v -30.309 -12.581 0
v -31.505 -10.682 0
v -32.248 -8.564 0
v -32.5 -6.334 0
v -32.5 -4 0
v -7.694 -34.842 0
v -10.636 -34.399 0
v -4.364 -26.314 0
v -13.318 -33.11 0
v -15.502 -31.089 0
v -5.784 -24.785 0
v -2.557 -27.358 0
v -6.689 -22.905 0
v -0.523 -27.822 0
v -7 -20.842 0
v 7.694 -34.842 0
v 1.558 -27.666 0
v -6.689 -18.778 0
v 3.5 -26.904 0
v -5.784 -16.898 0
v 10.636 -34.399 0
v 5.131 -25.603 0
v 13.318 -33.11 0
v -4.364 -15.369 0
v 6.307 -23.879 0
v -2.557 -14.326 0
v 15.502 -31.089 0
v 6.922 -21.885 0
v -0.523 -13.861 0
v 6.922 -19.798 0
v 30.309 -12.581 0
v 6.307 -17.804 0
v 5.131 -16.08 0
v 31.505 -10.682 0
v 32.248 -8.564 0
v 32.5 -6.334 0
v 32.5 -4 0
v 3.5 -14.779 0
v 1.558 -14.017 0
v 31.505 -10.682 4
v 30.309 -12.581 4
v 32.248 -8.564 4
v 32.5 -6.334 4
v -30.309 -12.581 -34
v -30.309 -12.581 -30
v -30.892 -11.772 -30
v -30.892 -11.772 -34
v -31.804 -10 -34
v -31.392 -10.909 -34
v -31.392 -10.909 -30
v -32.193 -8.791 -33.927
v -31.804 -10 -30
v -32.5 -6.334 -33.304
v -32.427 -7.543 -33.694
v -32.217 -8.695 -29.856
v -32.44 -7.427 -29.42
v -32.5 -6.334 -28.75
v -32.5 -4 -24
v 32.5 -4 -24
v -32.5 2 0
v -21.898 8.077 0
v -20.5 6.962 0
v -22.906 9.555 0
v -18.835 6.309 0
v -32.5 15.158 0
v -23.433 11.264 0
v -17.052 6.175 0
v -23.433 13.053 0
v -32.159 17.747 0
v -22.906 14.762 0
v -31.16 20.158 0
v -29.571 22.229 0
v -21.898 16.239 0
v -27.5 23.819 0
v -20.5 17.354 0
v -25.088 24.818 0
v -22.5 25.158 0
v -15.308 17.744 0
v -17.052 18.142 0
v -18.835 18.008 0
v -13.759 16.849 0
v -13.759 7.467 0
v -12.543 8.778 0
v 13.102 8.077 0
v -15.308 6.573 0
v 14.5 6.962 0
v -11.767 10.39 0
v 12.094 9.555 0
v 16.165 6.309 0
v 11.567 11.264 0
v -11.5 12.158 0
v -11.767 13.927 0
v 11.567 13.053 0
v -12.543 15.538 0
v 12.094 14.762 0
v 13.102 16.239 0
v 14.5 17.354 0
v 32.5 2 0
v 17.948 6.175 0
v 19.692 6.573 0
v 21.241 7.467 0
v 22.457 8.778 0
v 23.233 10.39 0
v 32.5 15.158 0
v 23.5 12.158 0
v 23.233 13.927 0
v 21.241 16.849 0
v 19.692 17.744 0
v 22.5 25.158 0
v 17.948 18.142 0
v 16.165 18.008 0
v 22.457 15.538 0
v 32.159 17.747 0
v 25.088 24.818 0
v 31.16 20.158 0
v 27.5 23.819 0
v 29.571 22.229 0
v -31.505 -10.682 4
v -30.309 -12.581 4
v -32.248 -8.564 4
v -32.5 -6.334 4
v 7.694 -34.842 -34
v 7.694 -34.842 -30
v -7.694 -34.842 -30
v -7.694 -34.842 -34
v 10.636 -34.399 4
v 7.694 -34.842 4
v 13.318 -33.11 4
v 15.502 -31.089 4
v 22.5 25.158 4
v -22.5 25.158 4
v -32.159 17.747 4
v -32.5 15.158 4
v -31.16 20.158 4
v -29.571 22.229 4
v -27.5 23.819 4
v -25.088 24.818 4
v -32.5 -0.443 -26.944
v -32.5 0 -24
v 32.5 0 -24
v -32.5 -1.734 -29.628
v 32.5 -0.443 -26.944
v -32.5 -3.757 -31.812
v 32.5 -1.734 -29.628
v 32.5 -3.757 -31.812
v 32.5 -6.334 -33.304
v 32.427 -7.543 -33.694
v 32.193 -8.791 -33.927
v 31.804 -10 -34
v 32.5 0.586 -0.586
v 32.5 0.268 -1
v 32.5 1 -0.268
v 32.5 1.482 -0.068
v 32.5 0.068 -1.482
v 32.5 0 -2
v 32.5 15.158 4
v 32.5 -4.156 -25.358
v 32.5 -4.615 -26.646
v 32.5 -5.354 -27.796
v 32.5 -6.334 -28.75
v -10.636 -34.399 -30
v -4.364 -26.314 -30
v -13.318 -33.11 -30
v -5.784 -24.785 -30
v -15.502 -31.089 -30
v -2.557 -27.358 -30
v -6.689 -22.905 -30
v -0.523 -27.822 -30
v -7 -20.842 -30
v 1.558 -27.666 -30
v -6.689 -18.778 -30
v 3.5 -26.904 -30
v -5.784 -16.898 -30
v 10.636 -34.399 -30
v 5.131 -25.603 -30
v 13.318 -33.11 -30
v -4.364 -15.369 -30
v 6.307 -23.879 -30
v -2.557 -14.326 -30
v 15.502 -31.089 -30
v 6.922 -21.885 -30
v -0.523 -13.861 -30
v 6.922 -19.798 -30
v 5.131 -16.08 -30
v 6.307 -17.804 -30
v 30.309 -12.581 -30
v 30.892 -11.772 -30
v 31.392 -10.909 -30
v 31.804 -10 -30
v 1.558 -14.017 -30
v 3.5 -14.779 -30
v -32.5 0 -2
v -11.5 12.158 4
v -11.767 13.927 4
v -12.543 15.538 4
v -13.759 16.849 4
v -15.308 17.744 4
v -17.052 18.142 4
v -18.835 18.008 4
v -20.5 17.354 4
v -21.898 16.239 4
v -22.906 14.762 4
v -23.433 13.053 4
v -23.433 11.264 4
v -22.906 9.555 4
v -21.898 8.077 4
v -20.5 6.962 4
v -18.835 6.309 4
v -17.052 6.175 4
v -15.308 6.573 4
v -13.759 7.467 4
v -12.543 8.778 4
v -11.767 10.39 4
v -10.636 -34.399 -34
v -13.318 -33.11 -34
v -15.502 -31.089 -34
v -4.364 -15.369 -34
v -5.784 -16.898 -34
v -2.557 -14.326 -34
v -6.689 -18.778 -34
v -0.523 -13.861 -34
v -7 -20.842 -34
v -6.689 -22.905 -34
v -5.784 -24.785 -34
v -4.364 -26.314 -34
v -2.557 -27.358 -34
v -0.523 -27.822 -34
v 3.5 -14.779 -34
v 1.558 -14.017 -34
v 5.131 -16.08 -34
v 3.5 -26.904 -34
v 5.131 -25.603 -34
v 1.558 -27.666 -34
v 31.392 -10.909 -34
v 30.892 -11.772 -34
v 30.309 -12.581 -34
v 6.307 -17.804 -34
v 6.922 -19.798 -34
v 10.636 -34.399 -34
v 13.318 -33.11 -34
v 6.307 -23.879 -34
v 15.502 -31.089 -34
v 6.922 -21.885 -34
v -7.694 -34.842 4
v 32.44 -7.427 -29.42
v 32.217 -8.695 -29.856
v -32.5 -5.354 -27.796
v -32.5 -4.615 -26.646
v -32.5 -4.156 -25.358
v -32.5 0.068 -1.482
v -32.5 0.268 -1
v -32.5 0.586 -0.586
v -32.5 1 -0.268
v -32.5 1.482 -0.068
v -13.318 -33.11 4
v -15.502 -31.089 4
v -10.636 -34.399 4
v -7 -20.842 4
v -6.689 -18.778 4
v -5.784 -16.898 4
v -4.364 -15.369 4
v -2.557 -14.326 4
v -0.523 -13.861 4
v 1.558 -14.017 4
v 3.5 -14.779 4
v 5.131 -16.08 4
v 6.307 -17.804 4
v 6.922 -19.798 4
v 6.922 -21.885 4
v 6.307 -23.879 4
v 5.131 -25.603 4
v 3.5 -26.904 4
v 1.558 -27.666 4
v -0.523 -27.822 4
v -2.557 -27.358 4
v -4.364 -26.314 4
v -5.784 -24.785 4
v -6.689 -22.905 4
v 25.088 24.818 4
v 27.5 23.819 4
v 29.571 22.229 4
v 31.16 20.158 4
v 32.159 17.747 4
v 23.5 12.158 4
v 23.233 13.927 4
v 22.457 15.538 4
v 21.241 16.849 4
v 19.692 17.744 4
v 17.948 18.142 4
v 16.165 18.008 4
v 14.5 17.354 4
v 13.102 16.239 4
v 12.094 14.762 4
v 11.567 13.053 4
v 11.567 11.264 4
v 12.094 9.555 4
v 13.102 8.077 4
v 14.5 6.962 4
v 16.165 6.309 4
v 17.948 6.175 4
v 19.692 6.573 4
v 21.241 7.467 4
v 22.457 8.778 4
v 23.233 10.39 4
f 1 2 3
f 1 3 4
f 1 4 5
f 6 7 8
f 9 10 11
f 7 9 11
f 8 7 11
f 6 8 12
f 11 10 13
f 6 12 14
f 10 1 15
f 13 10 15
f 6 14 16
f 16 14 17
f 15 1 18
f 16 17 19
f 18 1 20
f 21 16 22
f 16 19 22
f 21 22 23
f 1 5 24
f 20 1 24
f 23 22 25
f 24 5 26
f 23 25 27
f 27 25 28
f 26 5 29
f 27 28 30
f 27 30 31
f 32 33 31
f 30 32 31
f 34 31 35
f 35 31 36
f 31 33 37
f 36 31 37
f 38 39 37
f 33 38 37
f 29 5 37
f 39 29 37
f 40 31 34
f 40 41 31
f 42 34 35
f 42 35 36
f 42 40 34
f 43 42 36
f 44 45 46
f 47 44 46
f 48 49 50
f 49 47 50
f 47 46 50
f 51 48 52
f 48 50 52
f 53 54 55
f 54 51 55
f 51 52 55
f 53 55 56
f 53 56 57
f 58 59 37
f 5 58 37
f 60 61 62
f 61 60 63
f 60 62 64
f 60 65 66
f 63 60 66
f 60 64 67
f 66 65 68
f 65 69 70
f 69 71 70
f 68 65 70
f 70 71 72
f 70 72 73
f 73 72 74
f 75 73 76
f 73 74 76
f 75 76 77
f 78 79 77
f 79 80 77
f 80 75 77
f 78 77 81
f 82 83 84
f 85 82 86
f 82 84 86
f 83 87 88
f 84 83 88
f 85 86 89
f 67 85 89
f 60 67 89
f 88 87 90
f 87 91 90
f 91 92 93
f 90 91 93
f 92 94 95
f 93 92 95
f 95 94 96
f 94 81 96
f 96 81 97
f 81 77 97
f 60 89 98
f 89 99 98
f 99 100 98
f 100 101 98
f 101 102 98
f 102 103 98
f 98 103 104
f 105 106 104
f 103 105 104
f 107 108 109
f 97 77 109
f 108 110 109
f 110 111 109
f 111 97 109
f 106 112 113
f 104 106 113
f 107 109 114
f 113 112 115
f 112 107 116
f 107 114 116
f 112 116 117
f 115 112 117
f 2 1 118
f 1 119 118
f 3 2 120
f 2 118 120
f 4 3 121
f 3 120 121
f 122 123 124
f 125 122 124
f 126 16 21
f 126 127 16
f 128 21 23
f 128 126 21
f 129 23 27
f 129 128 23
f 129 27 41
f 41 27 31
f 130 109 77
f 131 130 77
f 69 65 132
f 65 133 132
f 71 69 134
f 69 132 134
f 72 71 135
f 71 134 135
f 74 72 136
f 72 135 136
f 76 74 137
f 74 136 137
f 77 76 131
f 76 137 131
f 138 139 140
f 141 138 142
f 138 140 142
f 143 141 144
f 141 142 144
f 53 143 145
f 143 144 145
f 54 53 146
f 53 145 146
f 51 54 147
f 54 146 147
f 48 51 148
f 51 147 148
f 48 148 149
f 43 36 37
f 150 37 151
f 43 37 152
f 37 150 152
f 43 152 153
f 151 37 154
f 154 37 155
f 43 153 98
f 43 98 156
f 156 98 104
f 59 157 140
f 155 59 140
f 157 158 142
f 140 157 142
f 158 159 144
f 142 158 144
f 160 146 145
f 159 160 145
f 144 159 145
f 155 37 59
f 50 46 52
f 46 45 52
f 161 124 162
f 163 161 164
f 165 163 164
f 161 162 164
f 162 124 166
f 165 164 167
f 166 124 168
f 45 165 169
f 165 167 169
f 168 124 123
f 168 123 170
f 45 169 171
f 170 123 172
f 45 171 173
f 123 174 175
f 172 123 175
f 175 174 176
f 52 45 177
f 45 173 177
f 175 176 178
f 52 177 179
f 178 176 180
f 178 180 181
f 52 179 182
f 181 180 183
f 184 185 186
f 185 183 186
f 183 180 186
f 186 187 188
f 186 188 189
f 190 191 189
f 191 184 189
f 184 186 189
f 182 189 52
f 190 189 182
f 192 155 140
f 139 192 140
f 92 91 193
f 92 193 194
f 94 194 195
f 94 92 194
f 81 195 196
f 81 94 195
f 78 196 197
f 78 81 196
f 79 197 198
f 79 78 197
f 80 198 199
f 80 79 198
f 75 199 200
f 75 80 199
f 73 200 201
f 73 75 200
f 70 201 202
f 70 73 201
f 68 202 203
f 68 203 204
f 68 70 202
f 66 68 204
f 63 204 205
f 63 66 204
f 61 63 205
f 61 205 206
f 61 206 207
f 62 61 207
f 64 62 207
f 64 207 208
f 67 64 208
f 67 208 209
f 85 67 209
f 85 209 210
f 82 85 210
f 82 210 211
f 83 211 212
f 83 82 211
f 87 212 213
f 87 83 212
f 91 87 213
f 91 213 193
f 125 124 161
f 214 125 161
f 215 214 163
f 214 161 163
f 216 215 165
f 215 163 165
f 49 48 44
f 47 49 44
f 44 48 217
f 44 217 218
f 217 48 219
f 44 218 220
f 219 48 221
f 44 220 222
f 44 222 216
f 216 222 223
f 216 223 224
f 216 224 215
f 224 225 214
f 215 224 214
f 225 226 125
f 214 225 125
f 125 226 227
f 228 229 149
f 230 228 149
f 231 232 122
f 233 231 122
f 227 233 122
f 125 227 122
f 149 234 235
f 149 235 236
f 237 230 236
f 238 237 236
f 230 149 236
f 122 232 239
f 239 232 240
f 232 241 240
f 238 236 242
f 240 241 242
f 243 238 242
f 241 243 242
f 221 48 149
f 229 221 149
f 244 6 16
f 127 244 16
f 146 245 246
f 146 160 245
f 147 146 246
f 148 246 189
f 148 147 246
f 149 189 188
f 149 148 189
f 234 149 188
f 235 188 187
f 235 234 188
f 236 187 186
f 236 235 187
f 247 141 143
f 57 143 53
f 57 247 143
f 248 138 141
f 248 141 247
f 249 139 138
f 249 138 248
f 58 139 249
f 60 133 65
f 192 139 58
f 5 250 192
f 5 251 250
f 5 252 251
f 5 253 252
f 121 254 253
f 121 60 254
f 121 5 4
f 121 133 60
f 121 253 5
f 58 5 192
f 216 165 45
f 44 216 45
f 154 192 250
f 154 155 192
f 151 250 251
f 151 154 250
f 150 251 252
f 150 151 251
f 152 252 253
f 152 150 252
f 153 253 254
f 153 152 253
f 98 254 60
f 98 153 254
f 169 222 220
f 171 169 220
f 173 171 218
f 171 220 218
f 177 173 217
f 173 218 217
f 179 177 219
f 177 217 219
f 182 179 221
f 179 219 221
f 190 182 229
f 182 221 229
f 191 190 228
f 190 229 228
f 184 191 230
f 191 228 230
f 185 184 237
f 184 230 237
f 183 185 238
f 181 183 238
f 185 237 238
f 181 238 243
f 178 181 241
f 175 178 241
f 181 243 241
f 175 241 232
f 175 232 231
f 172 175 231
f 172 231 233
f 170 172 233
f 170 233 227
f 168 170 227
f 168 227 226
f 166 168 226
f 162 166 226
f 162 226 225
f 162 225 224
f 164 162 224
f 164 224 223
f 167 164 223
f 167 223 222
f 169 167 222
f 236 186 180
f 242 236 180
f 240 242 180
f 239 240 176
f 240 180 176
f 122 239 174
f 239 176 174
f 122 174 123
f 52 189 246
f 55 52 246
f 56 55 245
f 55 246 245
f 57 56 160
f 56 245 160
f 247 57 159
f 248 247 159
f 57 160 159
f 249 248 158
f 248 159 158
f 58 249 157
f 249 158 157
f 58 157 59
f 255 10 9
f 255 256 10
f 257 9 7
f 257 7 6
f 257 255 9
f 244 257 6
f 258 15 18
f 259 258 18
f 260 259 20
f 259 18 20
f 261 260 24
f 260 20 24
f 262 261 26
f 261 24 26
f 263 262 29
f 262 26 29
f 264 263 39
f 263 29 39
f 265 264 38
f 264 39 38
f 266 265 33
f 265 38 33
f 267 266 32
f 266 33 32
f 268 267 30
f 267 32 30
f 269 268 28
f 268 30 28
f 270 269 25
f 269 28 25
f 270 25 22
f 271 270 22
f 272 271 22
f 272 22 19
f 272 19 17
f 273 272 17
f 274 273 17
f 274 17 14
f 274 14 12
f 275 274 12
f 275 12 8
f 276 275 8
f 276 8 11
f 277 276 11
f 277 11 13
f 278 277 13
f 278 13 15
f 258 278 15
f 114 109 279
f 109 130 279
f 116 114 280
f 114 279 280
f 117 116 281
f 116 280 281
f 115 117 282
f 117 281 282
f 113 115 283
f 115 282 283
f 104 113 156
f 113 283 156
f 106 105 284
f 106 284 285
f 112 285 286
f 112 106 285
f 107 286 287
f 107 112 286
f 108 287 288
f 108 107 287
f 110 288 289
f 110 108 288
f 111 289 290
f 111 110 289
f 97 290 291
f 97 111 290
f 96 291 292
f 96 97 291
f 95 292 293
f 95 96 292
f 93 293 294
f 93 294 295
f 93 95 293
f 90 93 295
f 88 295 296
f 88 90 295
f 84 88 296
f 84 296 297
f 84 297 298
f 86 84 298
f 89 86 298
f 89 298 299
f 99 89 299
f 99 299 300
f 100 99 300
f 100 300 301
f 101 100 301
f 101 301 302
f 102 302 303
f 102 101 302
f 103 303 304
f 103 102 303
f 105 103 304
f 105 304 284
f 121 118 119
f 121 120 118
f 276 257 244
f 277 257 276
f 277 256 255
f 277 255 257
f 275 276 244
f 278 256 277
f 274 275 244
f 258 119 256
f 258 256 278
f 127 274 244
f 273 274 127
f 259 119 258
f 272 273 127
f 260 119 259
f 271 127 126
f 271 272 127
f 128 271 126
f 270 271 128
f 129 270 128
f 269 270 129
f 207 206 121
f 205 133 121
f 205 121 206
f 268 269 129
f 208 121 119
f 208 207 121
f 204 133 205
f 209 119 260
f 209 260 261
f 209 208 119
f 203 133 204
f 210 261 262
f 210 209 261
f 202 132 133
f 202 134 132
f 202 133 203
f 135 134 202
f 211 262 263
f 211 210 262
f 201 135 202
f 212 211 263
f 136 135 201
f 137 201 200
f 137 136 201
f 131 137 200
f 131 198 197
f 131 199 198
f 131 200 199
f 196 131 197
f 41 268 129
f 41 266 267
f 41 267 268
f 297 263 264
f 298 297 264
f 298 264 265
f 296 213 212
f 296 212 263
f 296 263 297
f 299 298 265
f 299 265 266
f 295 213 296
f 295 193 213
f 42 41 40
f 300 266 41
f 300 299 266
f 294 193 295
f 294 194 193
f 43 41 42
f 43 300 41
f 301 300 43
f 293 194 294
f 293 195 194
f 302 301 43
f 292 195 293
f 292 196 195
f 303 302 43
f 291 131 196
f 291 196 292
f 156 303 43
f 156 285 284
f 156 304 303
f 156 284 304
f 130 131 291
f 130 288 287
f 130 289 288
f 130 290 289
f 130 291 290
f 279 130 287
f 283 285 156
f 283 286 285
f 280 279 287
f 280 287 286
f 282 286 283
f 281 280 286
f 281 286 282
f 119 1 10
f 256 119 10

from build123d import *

# Parameters (mm, degrees)
ESQUISSE1_R                         = 6
BOSS_EXTRU_1_DEPTH                  = 4
CONG_1_R                            = 10
BOSS_EXTRU_2_REACH                  = 34.5
BOSS_EXTRU_2_DIRECTION_2_REACH      = 34.5
CONG_2_R                            = 2
ENL_V_MAT_EXTRU_1_REACH             = 6
ENL_V_MAT_EXTRU_1_DIRECTION_2_DEPTH = 5
DIAM_TRE_DU_PER_AGE_14_0_14_1_D     = 14


with BuildPart() as part:
    # Esquisse1 → Boss.-Extru.1 (new body)
    with BuildSketch(Plane.XY):
        Polygon((-32.5, -9.841659782), (-12.5, -34.841659782), (12.5, -34.841659782), (32.5, -9.841659782), (32.5, 25.158340218), (-32.5, 25.158340218), align=None)
        with Locations((-17.5, 12.158340218)):
            Circle(ESQUISSE1_R, mode=Mode.SUBTRACT)
        with Locations((17.5, 12.158340218)):
            Circle(ESQUISSE1_R, mode=Mode.SUBTRACT)
    extrude(amount=BOSS_EXTRU_1_DEPTH)

    # Congé1
    cong_1_edges = [part.edges().sort_by_distance(p)[0] for p in [
        (-32.5, 25.158340218, 2),
        (32.5, 25.158340218, 2),
        (32.5, -9.841659782, 2),
        (12.5, -34.841659782, 2),
        (-12.5, -34.841659782, 2),
        (-32.5, -9.841659782, 2),
    ]]
    fillet(cong_1_edges, radius=CONG_1_R)

    # Boss.-Extru.2: up to this face of the body (flat: up to its plane)
    boss_extru_2_end = Plane(part.part.faces().sort_by_distance((32.5, 4.412245514, 2))[0])
    # Esquisse2 → Boss.-Extru.2 (add, up to the picked face)
    with BuildSketch(Plane(origin=(0, 0, 0), x_dir=(0, 0, -1), z_dir=(1, 0, 0)), mode=Mode.PRIVATE) as boss_extru_2_sk1:
        with BuildLine():
            Line((0, 0), (24, 0))
            ThreePointArc((24, 0), (31.071067812, -2.928932188), (34, -10))
            Line((34, -10), (34, -35))
            Line((34, -35), (30, -35))
            Line((30, -35), (30, -10))
            ThreePointArc((30, -10), (28.242640687, -5.757359313), (24, -4))
            Line((24, -4), (0, -4))
            Line((0, -4), (0, 0))
        make_face()
    boss_extru_2_tool1 = split(extrude(boss_extru_2_sk1.sketch, amount=BOSS_EXTRU_2_REACH, mode=Mode.PRIVATE), bisect_by=boss_extru_2_end, keep=Keep.BOTH, mode=Mode.PRIVATE)
    add(boss_extru_2_tool1.solids().sort_by(Axis((0, -0.487955, -12), (1, 0, 0)))[0])

    # Boss.-Extru.2 direction 2: up to this face of the body (flat: up to its plane)
    boss_extru_2_direction_2_end = Plane(part.part.faces().sort_by_distance((-32.5, 4.412245514, 2))[0])
    # Esquisse2 → Boss.-Extru.2 direction 2 (add, up to the picked face)
    with BuildSketch(Plane(origin=(0, 0, 0), x_dir=(0, 0, -1), z_dir=(1, 0, 0)), mode=Mode.PRIVATE) as boss_extru_2_direction_2_sk1:
        with BuildLine():
            Line((0, 0), (24, 0))
            ThreePointArc((24, 0), (31.071067812, -2.928932188), (34, -10))
            Line((34, -10), (34, -35))
            Line((34, -35), (30, -35))
            Line((30, -35), (30, -10))
            ThreePointArc((30, -10), (28.242640687, -5.757359313), (24, -4))
            Line((24, -4), (0, -4))
            Line((0, -4), (0, 0))
        make_face()
    boss_extru_2_direction_2_tool1 = split(extrude(boss_extru_2_direction_2_sk1.sketch, amount=-BOSS_EXTRU_2_DIRECTION_2_REACH, mode=Mode.PRIVATE), bisect_by=boss_extru_2_direction_2_end, keep=Keep.BOTH, mode=Mode.PRIVATE)
    add(boss_extru_2_direction_2_tool1.solids().sort_by(Axis((0, -0.487955, -12), (-1, 0, 0)))[0])

    # Congé2
    cong_2_edges = [part.edges().sort_by_distance(p)[0] for p in [
        (0, 0, 0),
    ]]
    fillet(cong_2_edges, radius=CONG_2_R)

    # Esquisse3 → Enlèv. mat.-Extru.1 (cut, up to next)
    with BuildSketch(Plane.XY.offset(-30), mode=Mode.PRIVATE) as enl_v_mat_extru_1_sk1:
        with BuildLine():
            Line((-32.5, -6.333849189), (-38.653299958, -6.333849189))
            Line((-38.653299958, -6.333849189), (-39.385367291, -42.953606415))
            Line((-39.385367291, -42.953606415), (40.318463565, -42.953606415))
            Line((40.318463565, -42.953606415), (40.318463565, -6.333849189))
            Line((40.318463565, -6.333849189), (32.5, -6.333849189))
            ThreePointArc((32.5, -6.333849189), (31.936283192, -9.643918603), (30.308688094, -12.580799664))
            Line((30.308688094, -12.580799664), (15.50243962, -31.088610258))
            ThreePointArc((15.50243962, -31.088610258), (12.02563883, -33.854692146), (7.693751525, -34.841659782))
            Line((7.693751525, -34.841659782), (-7.693751525, -34.841659782))
            ThreePointArc((-7.693751525, -34.841659782), (-12.02563883, -33.854692146), (-15.50243962, -31.088610258))
            Line((-15.50243962, -31.088610258), (-30.308688094, -12.580799664))
            ThreePointArc((-30.308688094, -12.580799664), (-31.936283192, -9.643918603), (-32.5, -6.333849189))
        make_face()
    enl_v_mat_extru_1_tool1 = extrude(enl_v_mat_extru_1_sk1.sketch, amount=-ENL_V_MAT_EXTRU_1_REACH, mode=Mode.PRIVATE) & part.part
    add(enl_v_mat_extru_1_tool1.solids().sort_by_distance((-35.57665, -7.210987, -30))[0], mode=Mode.SUBTRACT)

    # Esquisse3 → Enlèv. mat.-Extru.1 direction 2 (cut)
    with BuildSketch(Plane.XY.offset(-30)):
        with BuildLine():
            Line((-32.5, -6.333849189), (-38.653299958, -6.333849189))
            Line((-38.653299958, -6.333849189), (-39.385367291, -42.953606415))
            Line((-39.385367291, -42.953606415), (40.318463565, -42.953606415))
            Line((40.318463565, -42.953606415), (40.318463565, -6.333849189))
            Line((40.318463565, -6.333849189), (32.5, -6.333849189))
            ThreePointArc((32.5, -6.333849189), (31.936283192, -9.643918603), (30.308688094, -12.580799664))
            Line((30.308688094, -12.580799664), (15.50243962, -31.088610258))
            ThreePointArc((15.50243962, -31.088610258), (12.02563883, -33.854692146), (7.693751525, -34.841659782))
            Line((7.693751525, -34.841659782), (-7.693751525, -34.841659782))
            ThreePointArc((-7.693751525, -34.841659782), (-12.02563883, -33.854692146), (-15.50243962, -31.088610258))
            Line((-15.50243962, -31.088610258), (-30.308688094, -12.580799664))
            ThreePointArc((-30.308688094, -12.580799664), (-31.936283192, -9.643918603), (-32.5, -6.333849189))
        make_face()
    extrude(amount=ENL_V_MAT_EXTRU_1_DIRECTION_2_DEPTH, mode=Mode.SUBTRACT)

    # Diamètre du perçage Ø14.0 (14)1 (through all)
    with Locations(Plane.XY.offset(4)):
        with Locations((0, -20.841659782)):
            Hole(DIAM_TRE_DU_PER_AGE_14_0_14_1_D / 2)


solid = part.part
